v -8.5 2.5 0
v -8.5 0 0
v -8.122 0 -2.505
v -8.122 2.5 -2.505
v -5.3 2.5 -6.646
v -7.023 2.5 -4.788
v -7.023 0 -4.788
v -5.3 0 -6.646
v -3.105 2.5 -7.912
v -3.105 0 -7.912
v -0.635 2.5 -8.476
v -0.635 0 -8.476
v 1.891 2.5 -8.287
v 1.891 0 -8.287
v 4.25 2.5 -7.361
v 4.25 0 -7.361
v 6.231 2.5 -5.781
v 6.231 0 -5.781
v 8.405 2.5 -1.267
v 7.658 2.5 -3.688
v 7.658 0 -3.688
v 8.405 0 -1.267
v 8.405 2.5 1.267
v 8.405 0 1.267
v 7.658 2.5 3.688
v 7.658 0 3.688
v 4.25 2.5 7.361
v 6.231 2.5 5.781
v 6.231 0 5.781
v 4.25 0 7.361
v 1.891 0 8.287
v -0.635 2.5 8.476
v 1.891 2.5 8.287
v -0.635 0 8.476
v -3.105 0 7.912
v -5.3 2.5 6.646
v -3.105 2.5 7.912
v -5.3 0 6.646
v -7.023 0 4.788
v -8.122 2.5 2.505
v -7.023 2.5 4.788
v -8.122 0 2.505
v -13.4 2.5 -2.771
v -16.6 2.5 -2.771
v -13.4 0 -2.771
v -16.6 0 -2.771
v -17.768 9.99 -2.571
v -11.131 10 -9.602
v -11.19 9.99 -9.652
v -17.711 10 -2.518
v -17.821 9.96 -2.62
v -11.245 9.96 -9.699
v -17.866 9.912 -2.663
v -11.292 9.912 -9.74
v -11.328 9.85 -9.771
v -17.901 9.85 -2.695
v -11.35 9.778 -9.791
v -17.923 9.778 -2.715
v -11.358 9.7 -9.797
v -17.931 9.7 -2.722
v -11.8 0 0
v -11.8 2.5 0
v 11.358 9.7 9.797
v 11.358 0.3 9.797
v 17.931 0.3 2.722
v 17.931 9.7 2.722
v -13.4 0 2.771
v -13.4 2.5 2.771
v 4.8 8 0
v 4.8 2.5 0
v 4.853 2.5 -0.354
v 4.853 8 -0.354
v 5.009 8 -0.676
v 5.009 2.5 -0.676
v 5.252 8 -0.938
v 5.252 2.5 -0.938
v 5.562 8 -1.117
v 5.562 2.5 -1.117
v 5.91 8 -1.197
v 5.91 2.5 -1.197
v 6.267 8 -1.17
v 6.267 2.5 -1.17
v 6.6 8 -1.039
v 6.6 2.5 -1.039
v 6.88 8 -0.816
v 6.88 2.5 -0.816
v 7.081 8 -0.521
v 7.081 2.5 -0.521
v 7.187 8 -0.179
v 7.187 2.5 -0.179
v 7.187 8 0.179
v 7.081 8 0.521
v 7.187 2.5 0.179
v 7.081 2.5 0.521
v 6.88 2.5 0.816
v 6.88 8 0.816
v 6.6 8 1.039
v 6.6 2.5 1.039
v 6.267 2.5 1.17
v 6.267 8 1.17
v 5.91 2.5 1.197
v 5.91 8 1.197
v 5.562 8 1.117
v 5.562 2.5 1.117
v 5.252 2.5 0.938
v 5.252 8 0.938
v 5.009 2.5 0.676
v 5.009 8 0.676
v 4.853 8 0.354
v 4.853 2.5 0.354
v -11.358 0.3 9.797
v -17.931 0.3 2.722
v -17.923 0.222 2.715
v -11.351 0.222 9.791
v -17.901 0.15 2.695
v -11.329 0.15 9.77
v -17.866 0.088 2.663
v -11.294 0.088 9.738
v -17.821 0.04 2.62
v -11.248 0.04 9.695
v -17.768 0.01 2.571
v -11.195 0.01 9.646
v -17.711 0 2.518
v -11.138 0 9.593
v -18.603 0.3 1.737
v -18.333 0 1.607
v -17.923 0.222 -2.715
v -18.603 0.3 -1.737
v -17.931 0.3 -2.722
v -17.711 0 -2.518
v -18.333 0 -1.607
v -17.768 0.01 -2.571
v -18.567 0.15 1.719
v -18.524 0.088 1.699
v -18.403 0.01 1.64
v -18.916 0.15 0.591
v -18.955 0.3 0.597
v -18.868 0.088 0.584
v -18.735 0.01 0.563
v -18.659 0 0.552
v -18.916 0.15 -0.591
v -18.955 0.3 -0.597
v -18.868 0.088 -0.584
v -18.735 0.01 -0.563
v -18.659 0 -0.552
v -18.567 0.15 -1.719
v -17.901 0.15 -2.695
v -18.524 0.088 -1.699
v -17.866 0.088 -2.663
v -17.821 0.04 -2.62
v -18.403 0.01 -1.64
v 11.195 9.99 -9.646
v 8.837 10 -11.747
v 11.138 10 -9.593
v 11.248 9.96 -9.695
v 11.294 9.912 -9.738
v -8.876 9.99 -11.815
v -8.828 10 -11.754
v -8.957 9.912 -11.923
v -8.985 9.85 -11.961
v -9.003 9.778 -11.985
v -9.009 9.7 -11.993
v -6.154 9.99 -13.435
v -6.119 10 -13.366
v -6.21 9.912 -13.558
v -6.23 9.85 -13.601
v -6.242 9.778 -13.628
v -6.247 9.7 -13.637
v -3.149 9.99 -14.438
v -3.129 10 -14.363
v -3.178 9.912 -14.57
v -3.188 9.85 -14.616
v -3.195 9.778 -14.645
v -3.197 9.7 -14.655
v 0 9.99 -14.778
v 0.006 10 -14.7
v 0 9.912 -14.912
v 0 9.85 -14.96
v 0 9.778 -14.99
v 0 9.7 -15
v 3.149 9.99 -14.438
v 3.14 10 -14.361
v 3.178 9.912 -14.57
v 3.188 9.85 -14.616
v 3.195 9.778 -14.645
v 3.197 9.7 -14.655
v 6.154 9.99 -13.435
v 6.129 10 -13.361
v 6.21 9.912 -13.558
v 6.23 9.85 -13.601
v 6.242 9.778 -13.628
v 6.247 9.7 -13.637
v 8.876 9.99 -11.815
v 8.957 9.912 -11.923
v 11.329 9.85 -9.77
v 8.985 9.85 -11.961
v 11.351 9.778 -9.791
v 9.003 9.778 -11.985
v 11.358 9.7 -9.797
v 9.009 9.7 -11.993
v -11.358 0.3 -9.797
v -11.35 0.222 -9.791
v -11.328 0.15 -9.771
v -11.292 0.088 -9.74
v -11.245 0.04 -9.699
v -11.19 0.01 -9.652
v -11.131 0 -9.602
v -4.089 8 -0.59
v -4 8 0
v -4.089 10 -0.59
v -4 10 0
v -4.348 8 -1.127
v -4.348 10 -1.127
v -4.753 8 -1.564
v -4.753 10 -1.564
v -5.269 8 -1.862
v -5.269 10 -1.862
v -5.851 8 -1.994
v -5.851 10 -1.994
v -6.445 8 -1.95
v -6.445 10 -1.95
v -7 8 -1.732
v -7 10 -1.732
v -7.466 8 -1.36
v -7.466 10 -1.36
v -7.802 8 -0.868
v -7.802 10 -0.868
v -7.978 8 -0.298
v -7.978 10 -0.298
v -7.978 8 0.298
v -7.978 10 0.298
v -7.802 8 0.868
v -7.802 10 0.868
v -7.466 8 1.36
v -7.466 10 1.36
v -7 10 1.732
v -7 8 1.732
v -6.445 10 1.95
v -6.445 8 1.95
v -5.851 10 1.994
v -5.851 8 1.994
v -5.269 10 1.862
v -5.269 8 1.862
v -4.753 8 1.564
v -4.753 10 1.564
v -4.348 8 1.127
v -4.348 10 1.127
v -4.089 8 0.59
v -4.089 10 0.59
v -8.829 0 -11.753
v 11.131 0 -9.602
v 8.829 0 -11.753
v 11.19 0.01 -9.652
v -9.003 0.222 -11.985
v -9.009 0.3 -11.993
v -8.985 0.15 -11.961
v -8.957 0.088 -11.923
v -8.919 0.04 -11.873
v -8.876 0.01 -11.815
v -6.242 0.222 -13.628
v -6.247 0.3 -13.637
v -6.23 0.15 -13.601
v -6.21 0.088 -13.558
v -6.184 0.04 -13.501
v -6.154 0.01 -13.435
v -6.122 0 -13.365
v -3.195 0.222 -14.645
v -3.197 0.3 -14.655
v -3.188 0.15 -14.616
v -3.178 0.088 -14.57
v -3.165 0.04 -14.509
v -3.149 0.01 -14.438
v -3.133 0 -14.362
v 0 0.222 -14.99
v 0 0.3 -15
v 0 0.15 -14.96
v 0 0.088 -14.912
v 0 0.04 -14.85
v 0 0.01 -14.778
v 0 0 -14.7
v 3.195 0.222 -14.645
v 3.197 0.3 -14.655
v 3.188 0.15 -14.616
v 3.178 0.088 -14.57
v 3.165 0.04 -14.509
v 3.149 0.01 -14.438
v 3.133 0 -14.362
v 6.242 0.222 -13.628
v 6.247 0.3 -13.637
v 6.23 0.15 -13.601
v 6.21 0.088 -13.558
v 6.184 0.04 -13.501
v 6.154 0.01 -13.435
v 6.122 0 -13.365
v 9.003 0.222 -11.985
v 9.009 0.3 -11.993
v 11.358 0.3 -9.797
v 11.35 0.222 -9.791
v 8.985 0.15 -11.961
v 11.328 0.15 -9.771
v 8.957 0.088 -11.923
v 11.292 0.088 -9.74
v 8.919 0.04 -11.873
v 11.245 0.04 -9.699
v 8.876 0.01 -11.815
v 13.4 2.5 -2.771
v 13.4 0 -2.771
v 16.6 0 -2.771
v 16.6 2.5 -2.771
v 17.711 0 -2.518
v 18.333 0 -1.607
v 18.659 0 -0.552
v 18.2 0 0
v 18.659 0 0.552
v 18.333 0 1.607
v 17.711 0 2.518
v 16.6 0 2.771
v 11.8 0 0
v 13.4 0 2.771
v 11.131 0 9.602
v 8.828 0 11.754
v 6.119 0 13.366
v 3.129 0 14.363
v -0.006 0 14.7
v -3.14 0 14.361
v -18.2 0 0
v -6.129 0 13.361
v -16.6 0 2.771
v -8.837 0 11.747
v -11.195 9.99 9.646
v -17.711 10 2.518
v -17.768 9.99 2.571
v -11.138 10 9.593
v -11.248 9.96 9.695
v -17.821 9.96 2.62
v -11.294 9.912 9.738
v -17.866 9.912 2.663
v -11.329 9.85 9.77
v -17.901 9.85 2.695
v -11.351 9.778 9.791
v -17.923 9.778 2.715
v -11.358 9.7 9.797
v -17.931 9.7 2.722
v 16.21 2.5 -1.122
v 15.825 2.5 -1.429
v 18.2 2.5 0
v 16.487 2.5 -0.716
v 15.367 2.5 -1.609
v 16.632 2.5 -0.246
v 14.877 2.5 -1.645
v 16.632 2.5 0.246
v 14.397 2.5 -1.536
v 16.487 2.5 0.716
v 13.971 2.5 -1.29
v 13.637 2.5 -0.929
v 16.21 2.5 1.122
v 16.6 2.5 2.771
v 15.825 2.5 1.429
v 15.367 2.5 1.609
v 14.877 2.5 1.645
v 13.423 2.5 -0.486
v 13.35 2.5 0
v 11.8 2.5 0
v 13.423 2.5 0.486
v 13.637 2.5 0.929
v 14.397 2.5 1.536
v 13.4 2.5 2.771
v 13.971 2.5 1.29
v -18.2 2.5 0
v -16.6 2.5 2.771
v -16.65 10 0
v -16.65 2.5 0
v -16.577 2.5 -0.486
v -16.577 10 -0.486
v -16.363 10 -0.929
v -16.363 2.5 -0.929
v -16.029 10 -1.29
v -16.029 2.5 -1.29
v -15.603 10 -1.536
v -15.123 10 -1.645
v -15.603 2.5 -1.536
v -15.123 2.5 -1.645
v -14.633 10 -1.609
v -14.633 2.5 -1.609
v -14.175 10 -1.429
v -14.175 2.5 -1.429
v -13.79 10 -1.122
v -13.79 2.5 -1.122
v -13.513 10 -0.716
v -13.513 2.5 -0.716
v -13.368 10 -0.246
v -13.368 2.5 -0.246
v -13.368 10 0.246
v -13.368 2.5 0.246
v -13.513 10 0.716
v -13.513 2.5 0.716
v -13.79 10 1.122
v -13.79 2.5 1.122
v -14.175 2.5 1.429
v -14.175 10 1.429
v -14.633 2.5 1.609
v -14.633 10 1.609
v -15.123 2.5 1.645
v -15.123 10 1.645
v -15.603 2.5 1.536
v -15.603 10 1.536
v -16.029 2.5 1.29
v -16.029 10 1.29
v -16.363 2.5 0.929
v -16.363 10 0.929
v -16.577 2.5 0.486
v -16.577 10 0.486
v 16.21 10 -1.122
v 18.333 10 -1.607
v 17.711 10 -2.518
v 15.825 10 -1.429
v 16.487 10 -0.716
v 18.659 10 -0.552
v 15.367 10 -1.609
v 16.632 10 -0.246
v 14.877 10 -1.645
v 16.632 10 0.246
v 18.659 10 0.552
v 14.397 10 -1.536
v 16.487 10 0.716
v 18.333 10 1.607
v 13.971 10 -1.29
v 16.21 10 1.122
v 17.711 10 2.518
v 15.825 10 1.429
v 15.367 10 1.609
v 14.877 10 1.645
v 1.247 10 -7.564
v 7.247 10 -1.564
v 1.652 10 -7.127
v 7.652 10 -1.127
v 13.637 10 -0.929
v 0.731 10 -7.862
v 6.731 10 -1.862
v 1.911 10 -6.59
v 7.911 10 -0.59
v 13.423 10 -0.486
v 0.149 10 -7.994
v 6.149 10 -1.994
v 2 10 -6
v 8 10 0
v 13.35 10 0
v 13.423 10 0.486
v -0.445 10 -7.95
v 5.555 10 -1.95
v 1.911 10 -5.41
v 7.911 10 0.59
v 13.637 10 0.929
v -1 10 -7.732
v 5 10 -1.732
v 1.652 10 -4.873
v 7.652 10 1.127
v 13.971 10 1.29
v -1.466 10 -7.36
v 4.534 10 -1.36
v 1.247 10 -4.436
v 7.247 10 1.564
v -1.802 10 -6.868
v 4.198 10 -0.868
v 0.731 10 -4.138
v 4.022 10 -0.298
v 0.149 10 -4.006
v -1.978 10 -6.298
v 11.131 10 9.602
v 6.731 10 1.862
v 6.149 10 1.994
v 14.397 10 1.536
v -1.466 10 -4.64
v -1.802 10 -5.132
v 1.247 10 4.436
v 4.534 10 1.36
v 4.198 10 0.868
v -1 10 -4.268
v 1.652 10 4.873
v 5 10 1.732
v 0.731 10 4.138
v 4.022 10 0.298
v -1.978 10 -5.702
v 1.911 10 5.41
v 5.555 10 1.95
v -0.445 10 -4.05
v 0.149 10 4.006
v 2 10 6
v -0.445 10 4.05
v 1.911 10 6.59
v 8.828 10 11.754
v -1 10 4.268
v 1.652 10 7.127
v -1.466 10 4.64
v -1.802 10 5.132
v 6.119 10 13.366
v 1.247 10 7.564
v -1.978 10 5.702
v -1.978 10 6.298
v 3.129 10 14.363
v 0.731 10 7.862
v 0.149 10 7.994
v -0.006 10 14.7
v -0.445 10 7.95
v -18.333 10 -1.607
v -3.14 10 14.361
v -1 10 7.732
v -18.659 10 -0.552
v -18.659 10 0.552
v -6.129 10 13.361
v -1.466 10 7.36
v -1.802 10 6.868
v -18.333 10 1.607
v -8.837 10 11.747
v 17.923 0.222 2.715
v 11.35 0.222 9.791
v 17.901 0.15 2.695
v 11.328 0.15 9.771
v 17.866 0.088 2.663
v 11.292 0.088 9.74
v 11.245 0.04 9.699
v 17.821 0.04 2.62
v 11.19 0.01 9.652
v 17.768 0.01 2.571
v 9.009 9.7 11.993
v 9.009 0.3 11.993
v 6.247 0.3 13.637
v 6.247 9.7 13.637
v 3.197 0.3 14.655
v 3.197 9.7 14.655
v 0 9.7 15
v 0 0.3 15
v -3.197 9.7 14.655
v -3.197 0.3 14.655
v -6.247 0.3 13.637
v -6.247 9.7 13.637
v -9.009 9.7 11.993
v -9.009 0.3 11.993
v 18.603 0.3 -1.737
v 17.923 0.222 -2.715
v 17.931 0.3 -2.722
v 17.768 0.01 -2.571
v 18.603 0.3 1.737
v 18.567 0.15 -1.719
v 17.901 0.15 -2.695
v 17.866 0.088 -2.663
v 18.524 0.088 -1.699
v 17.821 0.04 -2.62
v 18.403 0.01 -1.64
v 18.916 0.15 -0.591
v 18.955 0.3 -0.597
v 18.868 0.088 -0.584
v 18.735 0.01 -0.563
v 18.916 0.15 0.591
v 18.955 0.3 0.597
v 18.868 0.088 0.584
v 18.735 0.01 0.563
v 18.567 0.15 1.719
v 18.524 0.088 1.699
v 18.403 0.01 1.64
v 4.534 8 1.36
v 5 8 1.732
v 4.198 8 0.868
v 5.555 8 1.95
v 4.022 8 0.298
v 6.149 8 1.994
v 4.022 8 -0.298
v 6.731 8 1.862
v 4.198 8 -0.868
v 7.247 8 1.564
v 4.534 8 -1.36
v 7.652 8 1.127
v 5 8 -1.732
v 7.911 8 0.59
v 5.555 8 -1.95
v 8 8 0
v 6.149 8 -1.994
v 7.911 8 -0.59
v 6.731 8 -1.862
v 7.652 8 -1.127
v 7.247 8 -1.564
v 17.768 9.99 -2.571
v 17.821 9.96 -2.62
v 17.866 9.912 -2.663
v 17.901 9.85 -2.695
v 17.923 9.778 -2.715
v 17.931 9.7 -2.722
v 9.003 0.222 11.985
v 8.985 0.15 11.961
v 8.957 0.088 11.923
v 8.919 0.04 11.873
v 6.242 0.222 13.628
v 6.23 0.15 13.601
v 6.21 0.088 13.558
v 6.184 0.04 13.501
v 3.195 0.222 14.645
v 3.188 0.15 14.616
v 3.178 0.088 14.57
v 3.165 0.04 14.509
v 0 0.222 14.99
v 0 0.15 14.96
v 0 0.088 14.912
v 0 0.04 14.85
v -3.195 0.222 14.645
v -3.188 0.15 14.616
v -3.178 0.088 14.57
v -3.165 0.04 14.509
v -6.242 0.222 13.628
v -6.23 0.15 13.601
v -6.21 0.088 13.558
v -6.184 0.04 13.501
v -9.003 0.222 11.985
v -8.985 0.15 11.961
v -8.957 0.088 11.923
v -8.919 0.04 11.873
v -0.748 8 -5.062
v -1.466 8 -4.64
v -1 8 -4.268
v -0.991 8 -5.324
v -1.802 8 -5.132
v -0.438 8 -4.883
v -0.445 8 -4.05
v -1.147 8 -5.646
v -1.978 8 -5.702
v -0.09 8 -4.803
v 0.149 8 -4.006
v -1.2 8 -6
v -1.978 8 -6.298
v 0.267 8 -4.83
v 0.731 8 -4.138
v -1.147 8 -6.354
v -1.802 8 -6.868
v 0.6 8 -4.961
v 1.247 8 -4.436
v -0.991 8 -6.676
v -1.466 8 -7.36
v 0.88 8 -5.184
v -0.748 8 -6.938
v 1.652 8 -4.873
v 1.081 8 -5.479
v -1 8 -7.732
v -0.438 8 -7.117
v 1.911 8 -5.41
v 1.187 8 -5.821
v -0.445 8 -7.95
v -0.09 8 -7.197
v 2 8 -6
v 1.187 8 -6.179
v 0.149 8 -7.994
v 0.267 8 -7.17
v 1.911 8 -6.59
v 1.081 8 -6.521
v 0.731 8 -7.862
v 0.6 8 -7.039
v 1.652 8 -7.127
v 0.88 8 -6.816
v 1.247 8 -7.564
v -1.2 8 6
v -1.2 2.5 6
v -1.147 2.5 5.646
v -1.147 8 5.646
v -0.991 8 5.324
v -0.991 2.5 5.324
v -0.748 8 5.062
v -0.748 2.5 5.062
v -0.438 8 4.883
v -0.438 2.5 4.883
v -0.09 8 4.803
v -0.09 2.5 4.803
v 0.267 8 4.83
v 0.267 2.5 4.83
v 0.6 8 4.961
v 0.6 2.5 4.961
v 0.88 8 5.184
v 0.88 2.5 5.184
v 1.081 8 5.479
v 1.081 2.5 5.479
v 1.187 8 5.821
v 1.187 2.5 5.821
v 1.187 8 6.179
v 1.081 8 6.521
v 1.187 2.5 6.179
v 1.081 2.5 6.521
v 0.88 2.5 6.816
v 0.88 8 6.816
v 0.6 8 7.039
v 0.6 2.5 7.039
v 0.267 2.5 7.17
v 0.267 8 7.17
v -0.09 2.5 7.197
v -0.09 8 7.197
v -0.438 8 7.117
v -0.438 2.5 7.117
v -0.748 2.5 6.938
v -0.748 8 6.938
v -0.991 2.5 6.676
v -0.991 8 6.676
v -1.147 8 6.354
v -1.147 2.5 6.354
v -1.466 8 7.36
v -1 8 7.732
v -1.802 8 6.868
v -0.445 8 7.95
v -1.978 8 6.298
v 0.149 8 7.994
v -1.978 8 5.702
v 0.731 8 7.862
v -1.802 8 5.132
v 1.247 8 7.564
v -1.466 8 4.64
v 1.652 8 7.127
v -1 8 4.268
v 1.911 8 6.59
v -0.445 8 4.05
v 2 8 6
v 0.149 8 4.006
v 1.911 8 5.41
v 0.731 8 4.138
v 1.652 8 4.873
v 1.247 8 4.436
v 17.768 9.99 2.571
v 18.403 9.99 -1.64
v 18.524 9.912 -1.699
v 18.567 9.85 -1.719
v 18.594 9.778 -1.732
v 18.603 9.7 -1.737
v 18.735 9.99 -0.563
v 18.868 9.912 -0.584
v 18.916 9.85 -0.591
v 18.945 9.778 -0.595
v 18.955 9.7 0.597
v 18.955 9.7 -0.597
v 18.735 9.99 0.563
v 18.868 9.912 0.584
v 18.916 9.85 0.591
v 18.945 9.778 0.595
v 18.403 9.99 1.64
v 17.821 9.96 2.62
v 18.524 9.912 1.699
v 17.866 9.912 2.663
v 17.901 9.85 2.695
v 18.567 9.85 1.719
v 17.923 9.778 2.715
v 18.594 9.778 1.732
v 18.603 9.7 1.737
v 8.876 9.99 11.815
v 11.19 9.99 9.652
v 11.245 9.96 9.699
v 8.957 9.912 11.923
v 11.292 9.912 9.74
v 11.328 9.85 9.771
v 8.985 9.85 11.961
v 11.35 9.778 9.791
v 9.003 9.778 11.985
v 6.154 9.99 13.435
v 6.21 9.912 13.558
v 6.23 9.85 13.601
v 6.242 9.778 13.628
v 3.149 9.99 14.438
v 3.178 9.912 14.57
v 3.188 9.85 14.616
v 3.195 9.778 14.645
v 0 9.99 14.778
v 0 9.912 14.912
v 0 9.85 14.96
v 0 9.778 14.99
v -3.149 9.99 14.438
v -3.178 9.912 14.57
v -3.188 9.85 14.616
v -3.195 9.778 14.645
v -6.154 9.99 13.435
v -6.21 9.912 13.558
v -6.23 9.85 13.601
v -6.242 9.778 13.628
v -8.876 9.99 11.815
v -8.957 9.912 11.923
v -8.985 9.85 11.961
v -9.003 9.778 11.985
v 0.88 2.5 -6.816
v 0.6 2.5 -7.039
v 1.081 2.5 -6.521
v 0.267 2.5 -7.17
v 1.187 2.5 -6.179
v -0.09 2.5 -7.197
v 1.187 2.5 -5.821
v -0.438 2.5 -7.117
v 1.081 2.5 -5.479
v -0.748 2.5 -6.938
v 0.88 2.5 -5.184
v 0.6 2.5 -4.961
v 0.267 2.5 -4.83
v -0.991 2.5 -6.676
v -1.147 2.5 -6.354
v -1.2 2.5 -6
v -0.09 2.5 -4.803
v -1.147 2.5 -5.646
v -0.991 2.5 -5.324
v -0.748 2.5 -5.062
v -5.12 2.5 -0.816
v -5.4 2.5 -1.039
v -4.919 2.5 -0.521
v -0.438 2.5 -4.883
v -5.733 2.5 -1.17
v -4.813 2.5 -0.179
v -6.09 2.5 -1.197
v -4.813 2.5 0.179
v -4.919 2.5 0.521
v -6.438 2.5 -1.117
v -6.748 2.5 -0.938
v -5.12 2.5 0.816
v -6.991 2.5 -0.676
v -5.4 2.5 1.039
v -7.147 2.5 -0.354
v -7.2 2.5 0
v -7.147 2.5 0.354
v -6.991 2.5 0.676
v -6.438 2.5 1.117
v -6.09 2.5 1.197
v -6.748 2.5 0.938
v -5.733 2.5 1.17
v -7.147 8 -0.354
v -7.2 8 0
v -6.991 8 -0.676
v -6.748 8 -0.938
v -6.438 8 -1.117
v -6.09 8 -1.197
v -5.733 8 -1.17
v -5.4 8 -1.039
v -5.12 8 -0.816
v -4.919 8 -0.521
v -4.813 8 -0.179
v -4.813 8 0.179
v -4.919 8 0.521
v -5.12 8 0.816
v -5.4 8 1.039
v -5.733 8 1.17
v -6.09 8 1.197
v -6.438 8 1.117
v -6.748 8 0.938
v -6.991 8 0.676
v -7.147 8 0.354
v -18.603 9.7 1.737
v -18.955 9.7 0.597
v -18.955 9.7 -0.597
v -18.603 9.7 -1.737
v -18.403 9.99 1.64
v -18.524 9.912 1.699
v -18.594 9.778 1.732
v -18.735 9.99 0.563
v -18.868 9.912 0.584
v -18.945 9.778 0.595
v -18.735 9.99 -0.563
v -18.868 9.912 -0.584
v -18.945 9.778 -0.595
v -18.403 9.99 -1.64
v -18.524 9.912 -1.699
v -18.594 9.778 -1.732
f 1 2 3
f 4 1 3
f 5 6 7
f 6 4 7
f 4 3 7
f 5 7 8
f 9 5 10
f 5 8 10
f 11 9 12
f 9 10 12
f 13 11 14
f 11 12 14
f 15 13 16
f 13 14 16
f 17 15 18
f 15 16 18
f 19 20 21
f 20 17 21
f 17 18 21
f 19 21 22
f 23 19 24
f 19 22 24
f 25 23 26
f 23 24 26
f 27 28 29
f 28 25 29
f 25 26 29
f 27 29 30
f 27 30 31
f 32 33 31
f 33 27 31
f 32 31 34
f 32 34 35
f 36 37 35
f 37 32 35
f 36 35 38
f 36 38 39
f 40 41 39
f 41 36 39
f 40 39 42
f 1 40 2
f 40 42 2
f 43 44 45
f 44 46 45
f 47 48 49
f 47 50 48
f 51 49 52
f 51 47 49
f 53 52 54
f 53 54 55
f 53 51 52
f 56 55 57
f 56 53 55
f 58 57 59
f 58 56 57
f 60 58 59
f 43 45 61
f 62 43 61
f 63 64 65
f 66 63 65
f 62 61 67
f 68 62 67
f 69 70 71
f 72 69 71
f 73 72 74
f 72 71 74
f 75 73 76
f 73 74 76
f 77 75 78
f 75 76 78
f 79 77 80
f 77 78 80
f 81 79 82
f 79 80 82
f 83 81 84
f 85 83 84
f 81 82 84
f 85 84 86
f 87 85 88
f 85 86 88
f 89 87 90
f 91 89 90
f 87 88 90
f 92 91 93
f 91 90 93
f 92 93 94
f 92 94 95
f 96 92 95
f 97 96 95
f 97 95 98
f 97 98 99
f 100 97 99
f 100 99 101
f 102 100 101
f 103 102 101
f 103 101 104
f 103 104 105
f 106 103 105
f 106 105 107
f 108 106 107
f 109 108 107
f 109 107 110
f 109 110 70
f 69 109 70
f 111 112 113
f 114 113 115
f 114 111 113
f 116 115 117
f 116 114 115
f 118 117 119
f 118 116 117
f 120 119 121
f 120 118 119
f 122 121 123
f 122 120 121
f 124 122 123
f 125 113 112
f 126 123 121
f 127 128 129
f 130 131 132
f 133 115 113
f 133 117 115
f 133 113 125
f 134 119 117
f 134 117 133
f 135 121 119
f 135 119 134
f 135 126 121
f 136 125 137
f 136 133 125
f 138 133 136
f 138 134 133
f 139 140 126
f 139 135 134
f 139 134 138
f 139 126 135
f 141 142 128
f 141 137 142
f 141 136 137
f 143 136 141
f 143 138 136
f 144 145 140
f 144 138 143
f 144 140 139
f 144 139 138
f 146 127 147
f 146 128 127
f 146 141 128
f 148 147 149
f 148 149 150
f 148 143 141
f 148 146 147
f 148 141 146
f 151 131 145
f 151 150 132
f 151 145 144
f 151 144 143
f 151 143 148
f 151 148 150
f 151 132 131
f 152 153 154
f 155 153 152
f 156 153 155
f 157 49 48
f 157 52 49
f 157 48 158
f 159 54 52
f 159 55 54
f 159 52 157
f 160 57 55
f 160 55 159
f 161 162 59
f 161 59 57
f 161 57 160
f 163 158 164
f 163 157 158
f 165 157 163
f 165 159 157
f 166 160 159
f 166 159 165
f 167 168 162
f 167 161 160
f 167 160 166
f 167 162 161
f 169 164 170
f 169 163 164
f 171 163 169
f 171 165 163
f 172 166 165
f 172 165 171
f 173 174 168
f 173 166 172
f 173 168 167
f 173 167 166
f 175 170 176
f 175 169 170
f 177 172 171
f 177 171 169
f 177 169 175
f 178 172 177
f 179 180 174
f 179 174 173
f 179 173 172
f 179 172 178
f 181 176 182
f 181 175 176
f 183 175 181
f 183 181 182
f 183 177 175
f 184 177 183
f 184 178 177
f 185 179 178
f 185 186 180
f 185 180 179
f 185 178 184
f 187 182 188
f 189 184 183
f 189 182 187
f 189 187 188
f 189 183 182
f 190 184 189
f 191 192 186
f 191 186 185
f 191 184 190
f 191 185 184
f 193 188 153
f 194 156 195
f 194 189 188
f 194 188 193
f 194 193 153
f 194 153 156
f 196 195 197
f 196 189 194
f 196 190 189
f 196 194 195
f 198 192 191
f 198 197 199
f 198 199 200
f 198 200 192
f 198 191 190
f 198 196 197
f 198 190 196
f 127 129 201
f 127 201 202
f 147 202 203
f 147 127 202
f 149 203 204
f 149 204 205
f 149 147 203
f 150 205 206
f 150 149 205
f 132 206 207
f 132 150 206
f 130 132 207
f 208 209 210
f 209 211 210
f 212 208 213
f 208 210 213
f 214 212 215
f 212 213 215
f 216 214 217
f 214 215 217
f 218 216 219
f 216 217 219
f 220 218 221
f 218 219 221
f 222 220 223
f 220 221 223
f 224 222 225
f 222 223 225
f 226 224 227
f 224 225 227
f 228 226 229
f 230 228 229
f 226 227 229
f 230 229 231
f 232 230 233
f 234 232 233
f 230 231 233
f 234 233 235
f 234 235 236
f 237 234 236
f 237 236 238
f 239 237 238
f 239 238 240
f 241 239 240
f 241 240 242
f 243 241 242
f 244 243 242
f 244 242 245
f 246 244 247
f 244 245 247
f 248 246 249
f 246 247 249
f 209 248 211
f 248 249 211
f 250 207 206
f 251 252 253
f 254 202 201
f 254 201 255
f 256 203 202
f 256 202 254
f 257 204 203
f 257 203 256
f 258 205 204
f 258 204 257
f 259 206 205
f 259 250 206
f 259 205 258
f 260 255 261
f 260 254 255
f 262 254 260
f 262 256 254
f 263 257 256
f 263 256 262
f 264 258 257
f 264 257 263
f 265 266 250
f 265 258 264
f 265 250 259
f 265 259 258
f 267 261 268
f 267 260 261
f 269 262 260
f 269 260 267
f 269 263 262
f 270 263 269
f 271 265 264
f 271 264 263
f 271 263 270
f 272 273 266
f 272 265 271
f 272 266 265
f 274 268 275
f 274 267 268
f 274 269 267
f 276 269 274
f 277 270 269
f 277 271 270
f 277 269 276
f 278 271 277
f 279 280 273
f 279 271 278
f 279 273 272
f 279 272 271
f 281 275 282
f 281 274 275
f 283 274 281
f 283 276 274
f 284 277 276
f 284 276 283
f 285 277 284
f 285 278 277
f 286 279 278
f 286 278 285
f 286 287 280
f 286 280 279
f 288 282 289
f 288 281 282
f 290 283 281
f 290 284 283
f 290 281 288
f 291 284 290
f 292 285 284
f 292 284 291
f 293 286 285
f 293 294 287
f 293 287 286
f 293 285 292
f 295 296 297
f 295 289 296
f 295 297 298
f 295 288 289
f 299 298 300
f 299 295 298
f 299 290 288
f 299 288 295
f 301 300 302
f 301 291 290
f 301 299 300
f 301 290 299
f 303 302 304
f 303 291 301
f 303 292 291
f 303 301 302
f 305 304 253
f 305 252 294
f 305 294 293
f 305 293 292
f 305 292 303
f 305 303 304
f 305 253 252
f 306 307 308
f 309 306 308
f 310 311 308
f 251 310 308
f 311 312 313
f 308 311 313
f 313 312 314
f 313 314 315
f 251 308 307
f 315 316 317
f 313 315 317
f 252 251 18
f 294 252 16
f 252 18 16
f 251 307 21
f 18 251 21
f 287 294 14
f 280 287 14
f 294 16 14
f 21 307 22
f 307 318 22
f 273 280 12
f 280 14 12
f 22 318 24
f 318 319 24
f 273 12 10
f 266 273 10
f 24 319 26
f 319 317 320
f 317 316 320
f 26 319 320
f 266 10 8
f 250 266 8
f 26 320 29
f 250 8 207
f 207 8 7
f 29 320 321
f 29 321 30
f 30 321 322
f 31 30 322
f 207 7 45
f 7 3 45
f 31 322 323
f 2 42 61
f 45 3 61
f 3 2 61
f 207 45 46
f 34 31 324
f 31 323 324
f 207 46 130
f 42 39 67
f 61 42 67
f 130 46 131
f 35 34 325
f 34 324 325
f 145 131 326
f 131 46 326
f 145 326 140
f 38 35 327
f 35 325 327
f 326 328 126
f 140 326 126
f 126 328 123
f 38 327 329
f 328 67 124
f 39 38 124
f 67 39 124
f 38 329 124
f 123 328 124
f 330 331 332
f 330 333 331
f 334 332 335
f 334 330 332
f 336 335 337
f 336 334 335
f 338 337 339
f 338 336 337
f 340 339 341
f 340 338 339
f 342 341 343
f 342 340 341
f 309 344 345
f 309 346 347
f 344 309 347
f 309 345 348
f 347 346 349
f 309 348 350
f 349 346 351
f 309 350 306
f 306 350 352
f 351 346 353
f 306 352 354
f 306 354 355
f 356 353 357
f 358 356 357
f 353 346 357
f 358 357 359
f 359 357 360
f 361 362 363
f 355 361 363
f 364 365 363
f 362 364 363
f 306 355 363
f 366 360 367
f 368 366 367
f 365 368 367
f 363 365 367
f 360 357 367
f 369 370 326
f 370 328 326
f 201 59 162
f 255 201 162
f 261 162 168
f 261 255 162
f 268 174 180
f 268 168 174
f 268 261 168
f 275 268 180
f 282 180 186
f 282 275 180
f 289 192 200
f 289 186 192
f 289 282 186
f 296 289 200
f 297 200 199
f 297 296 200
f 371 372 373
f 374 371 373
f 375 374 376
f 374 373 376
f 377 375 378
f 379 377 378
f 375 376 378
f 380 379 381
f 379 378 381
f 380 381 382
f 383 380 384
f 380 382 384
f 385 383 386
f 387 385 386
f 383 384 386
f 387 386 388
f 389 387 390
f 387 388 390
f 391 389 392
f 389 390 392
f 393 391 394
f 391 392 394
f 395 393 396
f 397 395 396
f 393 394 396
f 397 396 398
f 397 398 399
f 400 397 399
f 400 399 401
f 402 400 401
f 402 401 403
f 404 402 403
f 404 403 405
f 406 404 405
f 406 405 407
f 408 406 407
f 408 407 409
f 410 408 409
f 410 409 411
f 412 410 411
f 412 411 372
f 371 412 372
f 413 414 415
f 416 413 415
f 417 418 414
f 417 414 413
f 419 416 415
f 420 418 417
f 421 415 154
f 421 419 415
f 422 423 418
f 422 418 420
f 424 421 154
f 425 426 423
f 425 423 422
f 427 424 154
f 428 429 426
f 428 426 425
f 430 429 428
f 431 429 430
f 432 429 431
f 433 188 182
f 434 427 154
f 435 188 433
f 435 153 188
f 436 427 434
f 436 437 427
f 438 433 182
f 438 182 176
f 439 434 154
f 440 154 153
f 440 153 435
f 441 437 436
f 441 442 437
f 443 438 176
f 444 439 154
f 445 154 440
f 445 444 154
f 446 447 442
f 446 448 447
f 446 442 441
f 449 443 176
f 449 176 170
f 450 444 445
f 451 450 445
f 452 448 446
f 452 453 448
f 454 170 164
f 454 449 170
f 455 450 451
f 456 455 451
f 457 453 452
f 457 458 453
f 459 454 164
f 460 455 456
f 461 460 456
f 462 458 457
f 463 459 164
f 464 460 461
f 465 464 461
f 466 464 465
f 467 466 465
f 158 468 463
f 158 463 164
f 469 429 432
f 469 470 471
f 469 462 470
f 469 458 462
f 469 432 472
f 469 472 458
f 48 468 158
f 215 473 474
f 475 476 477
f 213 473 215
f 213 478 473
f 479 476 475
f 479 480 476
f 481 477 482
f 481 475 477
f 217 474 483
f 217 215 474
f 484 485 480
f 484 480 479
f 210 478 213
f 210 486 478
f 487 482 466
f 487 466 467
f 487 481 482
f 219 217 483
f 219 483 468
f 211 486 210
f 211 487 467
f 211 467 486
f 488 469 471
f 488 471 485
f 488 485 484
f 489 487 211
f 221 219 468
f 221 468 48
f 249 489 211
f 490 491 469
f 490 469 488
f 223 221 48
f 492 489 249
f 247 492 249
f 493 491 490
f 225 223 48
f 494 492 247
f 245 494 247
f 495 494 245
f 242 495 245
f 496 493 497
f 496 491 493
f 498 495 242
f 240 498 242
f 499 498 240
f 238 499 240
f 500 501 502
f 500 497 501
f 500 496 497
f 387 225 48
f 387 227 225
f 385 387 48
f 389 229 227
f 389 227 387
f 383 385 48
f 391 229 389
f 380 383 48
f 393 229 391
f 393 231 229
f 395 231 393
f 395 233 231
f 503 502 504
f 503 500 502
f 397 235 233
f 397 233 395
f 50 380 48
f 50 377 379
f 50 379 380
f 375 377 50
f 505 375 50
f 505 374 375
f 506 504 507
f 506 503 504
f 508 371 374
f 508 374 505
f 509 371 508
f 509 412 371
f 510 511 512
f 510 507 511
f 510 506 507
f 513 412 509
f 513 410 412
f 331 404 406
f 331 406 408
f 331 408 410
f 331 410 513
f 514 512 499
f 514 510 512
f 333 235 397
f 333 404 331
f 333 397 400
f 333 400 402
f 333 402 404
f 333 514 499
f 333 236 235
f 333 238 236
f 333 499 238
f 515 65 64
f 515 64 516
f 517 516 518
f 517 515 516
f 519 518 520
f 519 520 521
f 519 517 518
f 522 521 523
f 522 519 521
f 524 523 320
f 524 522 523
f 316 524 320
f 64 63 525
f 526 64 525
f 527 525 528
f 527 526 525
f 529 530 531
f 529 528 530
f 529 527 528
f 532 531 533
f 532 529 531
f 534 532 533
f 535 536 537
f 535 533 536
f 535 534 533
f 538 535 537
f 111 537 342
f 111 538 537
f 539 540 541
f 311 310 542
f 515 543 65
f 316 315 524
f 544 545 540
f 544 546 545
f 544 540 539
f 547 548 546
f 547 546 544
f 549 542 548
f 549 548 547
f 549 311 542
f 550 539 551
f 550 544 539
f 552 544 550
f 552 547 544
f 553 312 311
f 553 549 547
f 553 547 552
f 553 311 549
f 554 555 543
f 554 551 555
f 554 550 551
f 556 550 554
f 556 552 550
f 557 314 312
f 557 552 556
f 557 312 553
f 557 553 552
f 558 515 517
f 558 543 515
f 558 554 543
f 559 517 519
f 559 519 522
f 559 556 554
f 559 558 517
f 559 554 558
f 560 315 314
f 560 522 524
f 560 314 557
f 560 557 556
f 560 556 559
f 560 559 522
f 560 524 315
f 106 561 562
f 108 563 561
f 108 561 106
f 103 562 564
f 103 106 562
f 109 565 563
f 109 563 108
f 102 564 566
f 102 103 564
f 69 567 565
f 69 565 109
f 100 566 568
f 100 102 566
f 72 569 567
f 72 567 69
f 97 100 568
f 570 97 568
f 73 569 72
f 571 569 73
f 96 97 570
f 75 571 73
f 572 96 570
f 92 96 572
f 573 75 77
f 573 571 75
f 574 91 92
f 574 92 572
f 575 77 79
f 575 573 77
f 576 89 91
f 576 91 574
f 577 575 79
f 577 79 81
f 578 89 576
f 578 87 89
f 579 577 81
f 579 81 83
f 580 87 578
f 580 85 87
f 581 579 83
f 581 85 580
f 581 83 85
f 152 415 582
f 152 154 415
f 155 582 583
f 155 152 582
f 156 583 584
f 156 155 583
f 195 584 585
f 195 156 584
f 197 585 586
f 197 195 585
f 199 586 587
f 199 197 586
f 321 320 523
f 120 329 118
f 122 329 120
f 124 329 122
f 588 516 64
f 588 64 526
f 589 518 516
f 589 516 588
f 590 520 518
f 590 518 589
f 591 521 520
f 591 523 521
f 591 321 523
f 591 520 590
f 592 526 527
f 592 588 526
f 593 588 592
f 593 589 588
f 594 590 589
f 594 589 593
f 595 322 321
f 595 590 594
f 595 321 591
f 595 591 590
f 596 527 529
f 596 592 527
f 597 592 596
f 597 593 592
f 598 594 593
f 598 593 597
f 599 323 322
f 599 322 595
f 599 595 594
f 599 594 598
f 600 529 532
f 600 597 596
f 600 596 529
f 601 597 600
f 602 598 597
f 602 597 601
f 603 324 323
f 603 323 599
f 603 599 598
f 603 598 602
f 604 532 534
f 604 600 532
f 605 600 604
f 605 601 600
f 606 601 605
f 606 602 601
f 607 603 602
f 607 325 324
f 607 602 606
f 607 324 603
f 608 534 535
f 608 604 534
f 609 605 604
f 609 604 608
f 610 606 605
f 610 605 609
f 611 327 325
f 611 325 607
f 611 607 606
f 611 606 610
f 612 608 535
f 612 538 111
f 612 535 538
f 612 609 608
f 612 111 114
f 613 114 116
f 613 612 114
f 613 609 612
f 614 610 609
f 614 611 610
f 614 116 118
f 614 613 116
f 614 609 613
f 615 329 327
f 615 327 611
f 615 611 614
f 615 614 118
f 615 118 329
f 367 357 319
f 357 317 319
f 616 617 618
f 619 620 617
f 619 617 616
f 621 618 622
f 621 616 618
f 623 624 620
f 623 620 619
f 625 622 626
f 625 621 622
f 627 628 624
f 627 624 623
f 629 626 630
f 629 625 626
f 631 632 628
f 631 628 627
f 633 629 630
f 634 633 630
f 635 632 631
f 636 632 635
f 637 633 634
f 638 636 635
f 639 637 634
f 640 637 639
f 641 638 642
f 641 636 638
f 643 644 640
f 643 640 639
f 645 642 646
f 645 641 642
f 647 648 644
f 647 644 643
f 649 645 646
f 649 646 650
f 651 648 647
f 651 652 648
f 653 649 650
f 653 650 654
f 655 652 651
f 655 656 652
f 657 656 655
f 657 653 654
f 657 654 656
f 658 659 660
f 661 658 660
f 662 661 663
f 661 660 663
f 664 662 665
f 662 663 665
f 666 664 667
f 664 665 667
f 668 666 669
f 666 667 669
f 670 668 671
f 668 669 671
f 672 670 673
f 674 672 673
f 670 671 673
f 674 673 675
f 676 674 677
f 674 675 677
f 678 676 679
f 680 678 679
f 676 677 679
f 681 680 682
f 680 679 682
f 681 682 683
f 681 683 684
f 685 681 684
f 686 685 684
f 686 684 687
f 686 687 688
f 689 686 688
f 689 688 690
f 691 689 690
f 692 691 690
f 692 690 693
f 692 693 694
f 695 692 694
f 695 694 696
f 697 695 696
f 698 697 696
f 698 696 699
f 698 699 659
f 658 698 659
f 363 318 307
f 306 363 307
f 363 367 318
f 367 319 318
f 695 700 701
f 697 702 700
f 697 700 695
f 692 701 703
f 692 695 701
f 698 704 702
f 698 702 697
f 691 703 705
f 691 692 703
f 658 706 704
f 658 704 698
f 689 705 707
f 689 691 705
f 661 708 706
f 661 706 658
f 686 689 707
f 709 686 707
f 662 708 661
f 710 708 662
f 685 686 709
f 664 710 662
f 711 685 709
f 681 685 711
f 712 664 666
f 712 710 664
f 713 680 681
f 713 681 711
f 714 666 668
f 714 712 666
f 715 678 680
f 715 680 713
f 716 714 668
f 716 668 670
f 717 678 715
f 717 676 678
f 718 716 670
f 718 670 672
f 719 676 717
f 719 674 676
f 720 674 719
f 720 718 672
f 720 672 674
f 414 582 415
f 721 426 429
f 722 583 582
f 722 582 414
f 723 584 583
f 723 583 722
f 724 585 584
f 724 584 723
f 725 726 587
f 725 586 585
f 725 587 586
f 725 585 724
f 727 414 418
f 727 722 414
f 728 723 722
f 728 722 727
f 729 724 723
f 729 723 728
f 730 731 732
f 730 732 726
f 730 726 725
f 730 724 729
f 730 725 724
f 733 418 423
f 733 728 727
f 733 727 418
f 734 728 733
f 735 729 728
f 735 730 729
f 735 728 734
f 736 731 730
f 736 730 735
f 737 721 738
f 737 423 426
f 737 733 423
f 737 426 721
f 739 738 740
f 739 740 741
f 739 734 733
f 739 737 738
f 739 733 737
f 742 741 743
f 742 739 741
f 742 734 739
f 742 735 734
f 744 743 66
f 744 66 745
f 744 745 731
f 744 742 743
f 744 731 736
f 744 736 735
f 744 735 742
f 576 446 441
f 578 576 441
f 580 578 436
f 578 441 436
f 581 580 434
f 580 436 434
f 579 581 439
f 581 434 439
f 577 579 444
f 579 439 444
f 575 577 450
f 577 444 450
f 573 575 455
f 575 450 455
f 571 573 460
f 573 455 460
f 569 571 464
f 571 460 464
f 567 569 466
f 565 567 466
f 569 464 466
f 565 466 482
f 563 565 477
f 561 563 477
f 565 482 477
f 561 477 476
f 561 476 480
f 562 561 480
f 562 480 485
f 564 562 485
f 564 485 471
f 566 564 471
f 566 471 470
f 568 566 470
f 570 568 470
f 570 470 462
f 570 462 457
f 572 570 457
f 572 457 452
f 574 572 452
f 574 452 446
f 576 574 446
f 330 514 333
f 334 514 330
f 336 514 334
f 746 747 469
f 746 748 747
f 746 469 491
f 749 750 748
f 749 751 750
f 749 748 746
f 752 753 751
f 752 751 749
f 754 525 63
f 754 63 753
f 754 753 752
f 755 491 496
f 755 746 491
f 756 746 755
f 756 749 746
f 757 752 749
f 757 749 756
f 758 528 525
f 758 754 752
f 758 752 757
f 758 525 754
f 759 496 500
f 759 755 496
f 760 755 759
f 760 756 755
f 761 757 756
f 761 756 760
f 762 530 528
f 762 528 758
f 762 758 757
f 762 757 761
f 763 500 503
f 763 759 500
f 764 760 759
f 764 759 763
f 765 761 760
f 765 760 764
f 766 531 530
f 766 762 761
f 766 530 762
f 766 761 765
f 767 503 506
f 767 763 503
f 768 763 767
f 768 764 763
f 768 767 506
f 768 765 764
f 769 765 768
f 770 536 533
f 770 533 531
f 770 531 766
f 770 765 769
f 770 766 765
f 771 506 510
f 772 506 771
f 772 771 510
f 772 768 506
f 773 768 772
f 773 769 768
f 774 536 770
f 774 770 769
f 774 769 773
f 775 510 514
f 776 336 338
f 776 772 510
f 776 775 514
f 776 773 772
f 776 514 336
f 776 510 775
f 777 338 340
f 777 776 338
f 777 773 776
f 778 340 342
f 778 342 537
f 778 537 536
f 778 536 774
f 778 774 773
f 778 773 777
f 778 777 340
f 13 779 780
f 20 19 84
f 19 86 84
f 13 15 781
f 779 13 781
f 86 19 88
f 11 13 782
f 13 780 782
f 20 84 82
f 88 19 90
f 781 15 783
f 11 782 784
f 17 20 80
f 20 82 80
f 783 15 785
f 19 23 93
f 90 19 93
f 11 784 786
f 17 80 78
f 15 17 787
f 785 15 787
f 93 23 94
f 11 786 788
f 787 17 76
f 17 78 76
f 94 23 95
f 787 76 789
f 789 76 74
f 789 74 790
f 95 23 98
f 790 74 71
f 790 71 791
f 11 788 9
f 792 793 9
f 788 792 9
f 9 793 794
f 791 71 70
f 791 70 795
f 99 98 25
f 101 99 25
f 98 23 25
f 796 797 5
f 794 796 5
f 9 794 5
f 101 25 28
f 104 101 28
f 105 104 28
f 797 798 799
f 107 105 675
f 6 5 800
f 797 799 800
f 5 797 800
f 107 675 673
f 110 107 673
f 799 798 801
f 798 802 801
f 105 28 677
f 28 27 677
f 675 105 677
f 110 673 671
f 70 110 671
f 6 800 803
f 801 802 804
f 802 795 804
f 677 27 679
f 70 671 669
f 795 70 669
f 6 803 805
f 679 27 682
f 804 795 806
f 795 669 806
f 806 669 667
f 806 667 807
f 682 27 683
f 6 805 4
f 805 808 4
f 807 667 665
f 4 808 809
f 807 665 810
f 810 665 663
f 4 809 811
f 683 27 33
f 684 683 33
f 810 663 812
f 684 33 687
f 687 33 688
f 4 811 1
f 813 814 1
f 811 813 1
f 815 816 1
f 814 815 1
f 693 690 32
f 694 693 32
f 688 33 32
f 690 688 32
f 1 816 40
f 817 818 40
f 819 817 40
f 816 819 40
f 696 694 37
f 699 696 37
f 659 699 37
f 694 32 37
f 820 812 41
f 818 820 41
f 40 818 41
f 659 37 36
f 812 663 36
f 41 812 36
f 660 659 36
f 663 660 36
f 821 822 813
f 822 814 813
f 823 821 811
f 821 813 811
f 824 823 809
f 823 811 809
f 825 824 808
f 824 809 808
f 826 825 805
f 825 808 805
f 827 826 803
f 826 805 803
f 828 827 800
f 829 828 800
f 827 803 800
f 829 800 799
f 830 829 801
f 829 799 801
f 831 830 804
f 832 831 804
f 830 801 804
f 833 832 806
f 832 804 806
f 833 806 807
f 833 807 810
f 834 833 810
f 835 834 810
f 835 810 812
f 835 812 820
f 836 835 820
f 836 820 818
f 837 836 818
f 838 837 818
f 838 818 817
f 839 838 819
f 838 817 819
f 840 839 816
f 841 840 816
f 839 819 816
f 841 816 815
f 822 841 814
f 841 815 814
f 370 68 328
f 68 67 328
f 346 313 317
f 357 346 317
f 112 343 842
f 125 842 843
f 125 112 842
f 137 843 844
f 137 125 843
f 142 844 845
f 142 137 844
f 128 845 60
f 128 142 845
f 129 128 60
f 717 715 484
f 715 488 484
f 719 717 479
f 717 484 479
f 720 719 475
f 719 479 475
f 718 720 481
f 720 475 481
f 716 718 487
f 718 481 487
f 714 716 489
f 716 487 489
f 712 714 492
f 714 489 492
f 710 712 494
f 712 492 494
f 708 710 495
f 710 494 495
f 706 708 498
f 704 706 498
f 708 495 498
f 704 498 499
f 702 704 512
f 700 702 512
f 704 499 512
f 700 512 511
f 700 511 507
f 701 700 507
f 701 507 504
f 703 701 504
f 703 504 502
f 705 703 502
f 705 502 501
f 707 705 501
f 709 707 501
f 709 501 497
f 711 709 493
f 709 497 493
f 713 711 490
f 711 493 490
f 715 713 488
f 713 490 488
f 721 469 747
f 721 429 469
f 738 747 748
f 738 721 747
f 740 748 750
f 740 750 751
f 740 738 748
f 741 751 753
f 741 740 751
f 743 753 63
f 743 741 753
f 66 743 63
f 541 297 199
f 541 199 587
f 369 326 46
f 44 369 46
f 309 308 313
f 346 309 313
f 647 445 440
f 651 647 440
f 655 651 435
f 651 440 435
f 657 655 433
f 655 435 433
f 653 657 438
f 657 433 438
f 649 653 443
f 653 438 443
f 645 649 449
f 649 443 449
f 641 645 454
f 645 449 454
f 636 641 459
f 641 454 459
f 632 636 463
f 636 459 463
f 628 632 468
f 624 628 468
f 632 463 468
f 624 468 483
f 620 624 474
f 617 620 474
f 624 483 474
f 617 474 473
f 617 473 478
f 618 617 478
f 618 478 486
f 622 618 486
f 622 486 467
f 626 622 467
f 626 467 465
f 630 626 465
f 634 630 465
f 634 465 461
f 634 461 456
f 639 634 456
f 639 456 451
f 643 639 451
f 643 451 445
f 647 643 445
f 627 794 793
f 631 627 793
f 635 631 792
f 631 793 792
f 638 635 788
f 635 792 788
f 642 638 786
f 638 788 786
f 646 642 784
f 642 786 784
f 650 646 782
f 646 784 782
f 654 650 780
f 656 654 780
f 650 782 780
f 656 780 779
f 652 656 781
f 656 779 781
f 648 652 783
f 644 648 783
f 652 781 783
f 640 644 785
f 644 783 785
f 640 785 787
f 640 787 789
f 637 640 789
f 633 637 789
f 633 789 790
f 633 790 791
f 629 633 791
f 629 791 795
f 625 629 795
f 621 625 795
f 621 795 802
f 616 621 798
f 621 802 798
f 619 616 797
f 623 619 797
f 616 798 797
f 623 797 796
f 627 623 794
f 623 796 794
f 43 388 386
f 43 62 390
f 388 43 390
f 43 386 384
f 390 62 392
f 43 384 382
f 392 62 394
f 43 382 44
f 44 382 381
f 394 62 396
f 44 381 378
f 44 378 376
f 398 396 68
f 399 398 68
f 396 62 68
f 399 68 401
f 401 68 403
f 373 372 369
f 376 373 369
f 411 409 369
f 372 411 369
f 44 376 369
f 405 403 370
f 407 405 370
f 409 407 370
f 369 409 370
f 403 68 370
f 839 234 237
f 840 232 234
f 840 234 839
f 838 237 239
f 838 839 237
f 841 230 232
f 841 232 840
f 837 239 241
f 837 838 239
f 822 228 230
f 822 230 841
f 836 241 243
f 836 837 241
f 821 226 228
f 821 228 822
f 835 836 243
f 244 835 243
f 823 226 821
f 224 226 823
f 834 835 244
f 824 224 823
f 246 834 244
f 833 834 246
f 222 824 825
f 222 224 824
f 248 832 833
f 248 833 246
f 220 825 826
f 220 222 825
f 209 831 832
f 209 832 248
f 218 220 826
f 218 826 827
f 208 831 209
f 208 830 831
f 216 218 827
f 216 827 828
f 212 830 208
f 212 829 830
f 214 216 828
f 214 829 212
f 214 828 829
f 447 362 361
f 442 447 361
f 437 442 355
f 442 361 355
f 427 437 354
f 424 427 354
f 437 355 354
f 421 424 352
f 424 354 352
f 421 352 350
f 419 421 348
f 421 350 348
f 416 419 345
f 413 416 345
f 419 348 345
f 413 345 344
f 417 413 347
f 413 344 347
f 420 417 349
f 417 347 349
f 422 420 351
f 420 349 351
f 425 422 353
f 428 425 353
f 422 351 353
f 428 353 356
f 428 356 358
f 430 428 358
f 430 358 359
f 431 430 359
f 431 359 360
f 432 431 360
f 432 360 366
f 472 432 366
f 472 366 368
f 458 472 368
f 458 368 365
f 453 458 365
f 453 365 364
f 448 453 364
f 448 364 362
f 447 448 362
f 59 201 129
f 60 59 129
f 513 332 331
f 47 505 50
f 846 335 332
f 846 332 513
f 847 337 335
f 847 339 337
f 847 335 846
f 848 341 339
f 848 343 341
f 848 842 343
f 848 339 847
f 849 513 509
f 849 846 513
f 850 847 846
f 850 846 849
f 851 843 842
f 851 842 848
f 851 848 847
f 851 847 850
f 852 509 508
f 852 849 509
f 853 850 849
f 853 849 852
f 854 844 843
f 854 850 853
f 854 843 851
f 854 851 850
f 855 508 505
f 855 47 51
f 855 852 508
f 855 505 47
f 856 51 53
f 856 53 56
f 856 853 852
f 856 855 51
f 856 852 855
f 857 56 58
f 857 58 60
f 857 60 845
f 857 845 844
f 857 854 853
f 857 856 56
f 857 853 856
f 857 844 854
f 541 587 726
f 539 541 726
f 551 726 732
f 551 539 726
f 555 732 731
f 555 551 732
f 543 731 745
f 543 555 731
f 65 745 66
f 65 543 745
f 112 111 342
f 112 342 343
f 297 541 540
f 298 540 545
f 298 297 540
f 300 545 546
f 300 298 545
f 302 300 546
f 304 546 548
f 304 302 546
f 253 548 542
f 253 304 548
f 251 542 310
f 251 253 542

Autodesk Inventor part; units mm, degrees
ref_plane "YZ Plane" through (0, 0, 0) normal (1, 0, 0) x (0, 1, 0)
ref_plane "XZ Plane" through (0, 0, 0) normal (0, 1, 0) x (-1, 0, 0)
ref_plane "XY Plane" through (0, 0, 0) normal (0, 0, 1) x (1, 0, 0)
sketch "Sketch1" plane through (0, 0, 0) normal (0, 1, 0) x (-1, 0, 0)
  circle A0 centre (0, 0) radius 15
  circle A1 centre (0, 0) radius 8.5
  circle A2 centre (15, 0) radius 4
  circle A3 centre (-15, 0) radius 4
  line L0 (10.6066, -10.6066) -> (17.9306, -2.7224)
  line L1 (-10.6066, -10.6066) -> (-17.9306, -2.7224)
  line L2 (10.6066, 10.6066) -> (17.9306, 2.7224)
  line L3 (-10.6066, 10.6066) -> (-17.9306, 2.7224)
  line L4 (16.6, -2.7713) -> (13.4, -2.7713)
  line L5 (13.4, -2.7713) -> (11.8, 0)
  line L6 (11.8, 0) -> (13.4, 2.7713)
  line L7 (13.4, 2.7713) -> (16.6, 2.7713)
  line L8 (16.6, 2.7713) -> (18.2, 0)
  line L9 (18.2, 0) -> (16.6, -2.7713)
  line L10 (15, -2.7713) -> (15, 2.7713)
  line L11 (11.8, 0) -> (15, 0)
  line L12 (-13.4, -2.7713) -> (-16.6, -2.7713)
  line L13 (-16.6, -2.7713) -> (-18.2, 0)
  line L14 (-18.2, 0) -> (-16.6, 2.7713)
  line L15 (-16.6, 2.7713) -> (-13.4, 2.7713)
  line L16 (-13.4, 2.7713) -> (-11.8, 0)
  line L17 (-11.8, 0) -> (-13.4, -2.7713)
  line L18 (-15, -2.7713) -> (-15, 2.7713)
  line L19 (-18.2, 0) -> (-15, 0)
  circle A4 centre (0, 0) radius 6
  circle A5 centre (0, -6) radius 1.2
  circle A6 centre (-6, 0) radius 1.2
  circle A7 centre (0, 6) radius 1.2
  circle A8 centre (6, 0) radius 1.2
  circle A9 centre (15, 0) radius 1.65
  circle A10 centre (-15, 0) radius 1.65
  point P0 (-11.3582, -9.7975)
  point P1 (11.3582, -9.7975)
  point P2 (11.3582, 9.7976)
  point P3 (-11.3582, 9.7976)
  dimension "d20" = 8
  dimension "d22" = 3.2
  dimension "d27" = 3.2
  dimension "d28" = 3.2
  dimension "d29" = 120
  dimension "d30" = 3.2
  dimension "d31" = 120
  dimension "d34" = 12
  dimension "d35" = 2.4
  dimension "d36" = 2.4
  dimension "d37" = 2.4
  dimension "d38" = 2.4
  dimension "d43" = 3.3
  dimension "d44" = 3.3
extrude "Extrusion1" add sketch "Sketch1" along normal blind 10 contours L2 A0 A2 L0 L1 A3 L3 | A0 L2 | L3 A0 | L2 A2 A0 | A0 A3 L3 | A2 A0 L4 L9 L8 L7 | A0 L7 L6 L5 L4 A2 | A3 A0 L12 L17 L16 L15 | A0 L15 L14 L13 L12 A3 | L7 L10 A9 A0 | A0 A9 L11 L6 L7 | A2 L0 A0 | L15 L16 L17 L12 A0 A10 | A0 A10 L18 L15 | A3 A0 L1 | A9 L10 A0 | A0 L11 A9 | L7 L8 L9 L4 L10 A9 | A0 L0 | L4 L5 L11 A9 A0 | A0 A9 L10 L4 | A10 A0 | A0 L18 A10 | L18 A10 L19 L14 L15 | L1 A0 | L10 A9 A0 | L10 A9 | A0 A9 L11 | A0 A10 L18 | L19 A10 L18 | L18 A10 L19 | L12 L18 A10 A0 | L18 L12 L13 L19 A10 | A1 | A4 A8 | A4 A8 | A8 A4 A5 A6 A7 | A7 A4 | A4 A7 | A5 A4 | A4 A5 | A6 A4 | A4 A6
extrude "Extrusion2" cut sketch "Sketch1" along normal blind 2.5 contours L7 L10 A9 A0 | A0 A9 L11 L6 L7 | L15 L16 L17 L12 A0 A10 | A0 A10 L18 L15 | A9 L10 A0 | A0 L11 A9 | L7 L8 L9 L4 L10 A9 | L4 L5 L11 A9 A0 | A0 A9 L10 L4 | A10 A0 | A0 L18 A10 | L18 A10 L19 L14 L15 | L10 A9 A0 | L10 A9 | A0 A9 L11 | A0 A10 L18 | L19 A10 L18 | L18 A10 L19 | L12 L18 A10 A0 | L18 L12 L13 L19 A10 | A1 | A4 A8 | A4 A8 | A8 A4 A5 A6 A7 | A7 A4 | A4 A7 | A5 A4 | A4 A5 | A6 A4 | A4 A6
extrude "Extrusion3" cut sketch "Sketch1" along normal blind 10 contours A9 L10 A0 | A0 L11 A9 | A10 A0 | A0 L18 A10 | L10 A9 A0 | L10 A9 | A0 A9 L11 | A0 A10 L18 | L19 A10 L18 | L18 A10 L19 | A4 A8 | A4 A8 | A7 A4 | A4 A7 | A5 A4 | A4 A5 | A6 A4 | A4 A6
fillet "Fillet1" radius 0.3 16 edges at (0, 0, -15) (-19, 0, 0) (-14.6444, 0, 6.26) (-14.6444, 0, -6.26) (0, 0, 15) (19, 0, 0) (14.6444, 0, -6.26) (14.6444, 0, 6.26) (-19, 10, 0) (-14.6444, 10, 6.26) (-14.6444, 10, -6.26) (0, 10, -15) (0, 10, 15) (19, 10, 0) (14.6444, 10, 6.26) (14.6444, 10, -6.26)
sketch "Sketch2" plane through (0, 10, 0) normal (0, 1, 0) x (1, 0, 0)
  circle A0 centre (-6, 0) radius 1.2 projected
  circle A1 centre (-6, 0) radius 2
  circle A2 centre (0, 6) radius 1.2 projected
  circle A3 centre (0, 6) radius 2
  circle A4 centre (6, 0) radius 1.2 projected
  circle A5 centre (6, 0) radius 2
  circle A6 centre (0, -6) radius 1.2 projected
  circle A7 centre (0, -6) radius 2
  point P0 (0, 0)
  dimension "d48" = 4
  dimension "d49" = 4
  dimension "d50" = 4
  dimension "d51" = 4
extrude "Extrusion5" cut sketch "Sketch2" against normal blind 2 contours A0 | A1 | A2 | A3 | A4 | A5 | A6 | A7
properties part number "neck"
